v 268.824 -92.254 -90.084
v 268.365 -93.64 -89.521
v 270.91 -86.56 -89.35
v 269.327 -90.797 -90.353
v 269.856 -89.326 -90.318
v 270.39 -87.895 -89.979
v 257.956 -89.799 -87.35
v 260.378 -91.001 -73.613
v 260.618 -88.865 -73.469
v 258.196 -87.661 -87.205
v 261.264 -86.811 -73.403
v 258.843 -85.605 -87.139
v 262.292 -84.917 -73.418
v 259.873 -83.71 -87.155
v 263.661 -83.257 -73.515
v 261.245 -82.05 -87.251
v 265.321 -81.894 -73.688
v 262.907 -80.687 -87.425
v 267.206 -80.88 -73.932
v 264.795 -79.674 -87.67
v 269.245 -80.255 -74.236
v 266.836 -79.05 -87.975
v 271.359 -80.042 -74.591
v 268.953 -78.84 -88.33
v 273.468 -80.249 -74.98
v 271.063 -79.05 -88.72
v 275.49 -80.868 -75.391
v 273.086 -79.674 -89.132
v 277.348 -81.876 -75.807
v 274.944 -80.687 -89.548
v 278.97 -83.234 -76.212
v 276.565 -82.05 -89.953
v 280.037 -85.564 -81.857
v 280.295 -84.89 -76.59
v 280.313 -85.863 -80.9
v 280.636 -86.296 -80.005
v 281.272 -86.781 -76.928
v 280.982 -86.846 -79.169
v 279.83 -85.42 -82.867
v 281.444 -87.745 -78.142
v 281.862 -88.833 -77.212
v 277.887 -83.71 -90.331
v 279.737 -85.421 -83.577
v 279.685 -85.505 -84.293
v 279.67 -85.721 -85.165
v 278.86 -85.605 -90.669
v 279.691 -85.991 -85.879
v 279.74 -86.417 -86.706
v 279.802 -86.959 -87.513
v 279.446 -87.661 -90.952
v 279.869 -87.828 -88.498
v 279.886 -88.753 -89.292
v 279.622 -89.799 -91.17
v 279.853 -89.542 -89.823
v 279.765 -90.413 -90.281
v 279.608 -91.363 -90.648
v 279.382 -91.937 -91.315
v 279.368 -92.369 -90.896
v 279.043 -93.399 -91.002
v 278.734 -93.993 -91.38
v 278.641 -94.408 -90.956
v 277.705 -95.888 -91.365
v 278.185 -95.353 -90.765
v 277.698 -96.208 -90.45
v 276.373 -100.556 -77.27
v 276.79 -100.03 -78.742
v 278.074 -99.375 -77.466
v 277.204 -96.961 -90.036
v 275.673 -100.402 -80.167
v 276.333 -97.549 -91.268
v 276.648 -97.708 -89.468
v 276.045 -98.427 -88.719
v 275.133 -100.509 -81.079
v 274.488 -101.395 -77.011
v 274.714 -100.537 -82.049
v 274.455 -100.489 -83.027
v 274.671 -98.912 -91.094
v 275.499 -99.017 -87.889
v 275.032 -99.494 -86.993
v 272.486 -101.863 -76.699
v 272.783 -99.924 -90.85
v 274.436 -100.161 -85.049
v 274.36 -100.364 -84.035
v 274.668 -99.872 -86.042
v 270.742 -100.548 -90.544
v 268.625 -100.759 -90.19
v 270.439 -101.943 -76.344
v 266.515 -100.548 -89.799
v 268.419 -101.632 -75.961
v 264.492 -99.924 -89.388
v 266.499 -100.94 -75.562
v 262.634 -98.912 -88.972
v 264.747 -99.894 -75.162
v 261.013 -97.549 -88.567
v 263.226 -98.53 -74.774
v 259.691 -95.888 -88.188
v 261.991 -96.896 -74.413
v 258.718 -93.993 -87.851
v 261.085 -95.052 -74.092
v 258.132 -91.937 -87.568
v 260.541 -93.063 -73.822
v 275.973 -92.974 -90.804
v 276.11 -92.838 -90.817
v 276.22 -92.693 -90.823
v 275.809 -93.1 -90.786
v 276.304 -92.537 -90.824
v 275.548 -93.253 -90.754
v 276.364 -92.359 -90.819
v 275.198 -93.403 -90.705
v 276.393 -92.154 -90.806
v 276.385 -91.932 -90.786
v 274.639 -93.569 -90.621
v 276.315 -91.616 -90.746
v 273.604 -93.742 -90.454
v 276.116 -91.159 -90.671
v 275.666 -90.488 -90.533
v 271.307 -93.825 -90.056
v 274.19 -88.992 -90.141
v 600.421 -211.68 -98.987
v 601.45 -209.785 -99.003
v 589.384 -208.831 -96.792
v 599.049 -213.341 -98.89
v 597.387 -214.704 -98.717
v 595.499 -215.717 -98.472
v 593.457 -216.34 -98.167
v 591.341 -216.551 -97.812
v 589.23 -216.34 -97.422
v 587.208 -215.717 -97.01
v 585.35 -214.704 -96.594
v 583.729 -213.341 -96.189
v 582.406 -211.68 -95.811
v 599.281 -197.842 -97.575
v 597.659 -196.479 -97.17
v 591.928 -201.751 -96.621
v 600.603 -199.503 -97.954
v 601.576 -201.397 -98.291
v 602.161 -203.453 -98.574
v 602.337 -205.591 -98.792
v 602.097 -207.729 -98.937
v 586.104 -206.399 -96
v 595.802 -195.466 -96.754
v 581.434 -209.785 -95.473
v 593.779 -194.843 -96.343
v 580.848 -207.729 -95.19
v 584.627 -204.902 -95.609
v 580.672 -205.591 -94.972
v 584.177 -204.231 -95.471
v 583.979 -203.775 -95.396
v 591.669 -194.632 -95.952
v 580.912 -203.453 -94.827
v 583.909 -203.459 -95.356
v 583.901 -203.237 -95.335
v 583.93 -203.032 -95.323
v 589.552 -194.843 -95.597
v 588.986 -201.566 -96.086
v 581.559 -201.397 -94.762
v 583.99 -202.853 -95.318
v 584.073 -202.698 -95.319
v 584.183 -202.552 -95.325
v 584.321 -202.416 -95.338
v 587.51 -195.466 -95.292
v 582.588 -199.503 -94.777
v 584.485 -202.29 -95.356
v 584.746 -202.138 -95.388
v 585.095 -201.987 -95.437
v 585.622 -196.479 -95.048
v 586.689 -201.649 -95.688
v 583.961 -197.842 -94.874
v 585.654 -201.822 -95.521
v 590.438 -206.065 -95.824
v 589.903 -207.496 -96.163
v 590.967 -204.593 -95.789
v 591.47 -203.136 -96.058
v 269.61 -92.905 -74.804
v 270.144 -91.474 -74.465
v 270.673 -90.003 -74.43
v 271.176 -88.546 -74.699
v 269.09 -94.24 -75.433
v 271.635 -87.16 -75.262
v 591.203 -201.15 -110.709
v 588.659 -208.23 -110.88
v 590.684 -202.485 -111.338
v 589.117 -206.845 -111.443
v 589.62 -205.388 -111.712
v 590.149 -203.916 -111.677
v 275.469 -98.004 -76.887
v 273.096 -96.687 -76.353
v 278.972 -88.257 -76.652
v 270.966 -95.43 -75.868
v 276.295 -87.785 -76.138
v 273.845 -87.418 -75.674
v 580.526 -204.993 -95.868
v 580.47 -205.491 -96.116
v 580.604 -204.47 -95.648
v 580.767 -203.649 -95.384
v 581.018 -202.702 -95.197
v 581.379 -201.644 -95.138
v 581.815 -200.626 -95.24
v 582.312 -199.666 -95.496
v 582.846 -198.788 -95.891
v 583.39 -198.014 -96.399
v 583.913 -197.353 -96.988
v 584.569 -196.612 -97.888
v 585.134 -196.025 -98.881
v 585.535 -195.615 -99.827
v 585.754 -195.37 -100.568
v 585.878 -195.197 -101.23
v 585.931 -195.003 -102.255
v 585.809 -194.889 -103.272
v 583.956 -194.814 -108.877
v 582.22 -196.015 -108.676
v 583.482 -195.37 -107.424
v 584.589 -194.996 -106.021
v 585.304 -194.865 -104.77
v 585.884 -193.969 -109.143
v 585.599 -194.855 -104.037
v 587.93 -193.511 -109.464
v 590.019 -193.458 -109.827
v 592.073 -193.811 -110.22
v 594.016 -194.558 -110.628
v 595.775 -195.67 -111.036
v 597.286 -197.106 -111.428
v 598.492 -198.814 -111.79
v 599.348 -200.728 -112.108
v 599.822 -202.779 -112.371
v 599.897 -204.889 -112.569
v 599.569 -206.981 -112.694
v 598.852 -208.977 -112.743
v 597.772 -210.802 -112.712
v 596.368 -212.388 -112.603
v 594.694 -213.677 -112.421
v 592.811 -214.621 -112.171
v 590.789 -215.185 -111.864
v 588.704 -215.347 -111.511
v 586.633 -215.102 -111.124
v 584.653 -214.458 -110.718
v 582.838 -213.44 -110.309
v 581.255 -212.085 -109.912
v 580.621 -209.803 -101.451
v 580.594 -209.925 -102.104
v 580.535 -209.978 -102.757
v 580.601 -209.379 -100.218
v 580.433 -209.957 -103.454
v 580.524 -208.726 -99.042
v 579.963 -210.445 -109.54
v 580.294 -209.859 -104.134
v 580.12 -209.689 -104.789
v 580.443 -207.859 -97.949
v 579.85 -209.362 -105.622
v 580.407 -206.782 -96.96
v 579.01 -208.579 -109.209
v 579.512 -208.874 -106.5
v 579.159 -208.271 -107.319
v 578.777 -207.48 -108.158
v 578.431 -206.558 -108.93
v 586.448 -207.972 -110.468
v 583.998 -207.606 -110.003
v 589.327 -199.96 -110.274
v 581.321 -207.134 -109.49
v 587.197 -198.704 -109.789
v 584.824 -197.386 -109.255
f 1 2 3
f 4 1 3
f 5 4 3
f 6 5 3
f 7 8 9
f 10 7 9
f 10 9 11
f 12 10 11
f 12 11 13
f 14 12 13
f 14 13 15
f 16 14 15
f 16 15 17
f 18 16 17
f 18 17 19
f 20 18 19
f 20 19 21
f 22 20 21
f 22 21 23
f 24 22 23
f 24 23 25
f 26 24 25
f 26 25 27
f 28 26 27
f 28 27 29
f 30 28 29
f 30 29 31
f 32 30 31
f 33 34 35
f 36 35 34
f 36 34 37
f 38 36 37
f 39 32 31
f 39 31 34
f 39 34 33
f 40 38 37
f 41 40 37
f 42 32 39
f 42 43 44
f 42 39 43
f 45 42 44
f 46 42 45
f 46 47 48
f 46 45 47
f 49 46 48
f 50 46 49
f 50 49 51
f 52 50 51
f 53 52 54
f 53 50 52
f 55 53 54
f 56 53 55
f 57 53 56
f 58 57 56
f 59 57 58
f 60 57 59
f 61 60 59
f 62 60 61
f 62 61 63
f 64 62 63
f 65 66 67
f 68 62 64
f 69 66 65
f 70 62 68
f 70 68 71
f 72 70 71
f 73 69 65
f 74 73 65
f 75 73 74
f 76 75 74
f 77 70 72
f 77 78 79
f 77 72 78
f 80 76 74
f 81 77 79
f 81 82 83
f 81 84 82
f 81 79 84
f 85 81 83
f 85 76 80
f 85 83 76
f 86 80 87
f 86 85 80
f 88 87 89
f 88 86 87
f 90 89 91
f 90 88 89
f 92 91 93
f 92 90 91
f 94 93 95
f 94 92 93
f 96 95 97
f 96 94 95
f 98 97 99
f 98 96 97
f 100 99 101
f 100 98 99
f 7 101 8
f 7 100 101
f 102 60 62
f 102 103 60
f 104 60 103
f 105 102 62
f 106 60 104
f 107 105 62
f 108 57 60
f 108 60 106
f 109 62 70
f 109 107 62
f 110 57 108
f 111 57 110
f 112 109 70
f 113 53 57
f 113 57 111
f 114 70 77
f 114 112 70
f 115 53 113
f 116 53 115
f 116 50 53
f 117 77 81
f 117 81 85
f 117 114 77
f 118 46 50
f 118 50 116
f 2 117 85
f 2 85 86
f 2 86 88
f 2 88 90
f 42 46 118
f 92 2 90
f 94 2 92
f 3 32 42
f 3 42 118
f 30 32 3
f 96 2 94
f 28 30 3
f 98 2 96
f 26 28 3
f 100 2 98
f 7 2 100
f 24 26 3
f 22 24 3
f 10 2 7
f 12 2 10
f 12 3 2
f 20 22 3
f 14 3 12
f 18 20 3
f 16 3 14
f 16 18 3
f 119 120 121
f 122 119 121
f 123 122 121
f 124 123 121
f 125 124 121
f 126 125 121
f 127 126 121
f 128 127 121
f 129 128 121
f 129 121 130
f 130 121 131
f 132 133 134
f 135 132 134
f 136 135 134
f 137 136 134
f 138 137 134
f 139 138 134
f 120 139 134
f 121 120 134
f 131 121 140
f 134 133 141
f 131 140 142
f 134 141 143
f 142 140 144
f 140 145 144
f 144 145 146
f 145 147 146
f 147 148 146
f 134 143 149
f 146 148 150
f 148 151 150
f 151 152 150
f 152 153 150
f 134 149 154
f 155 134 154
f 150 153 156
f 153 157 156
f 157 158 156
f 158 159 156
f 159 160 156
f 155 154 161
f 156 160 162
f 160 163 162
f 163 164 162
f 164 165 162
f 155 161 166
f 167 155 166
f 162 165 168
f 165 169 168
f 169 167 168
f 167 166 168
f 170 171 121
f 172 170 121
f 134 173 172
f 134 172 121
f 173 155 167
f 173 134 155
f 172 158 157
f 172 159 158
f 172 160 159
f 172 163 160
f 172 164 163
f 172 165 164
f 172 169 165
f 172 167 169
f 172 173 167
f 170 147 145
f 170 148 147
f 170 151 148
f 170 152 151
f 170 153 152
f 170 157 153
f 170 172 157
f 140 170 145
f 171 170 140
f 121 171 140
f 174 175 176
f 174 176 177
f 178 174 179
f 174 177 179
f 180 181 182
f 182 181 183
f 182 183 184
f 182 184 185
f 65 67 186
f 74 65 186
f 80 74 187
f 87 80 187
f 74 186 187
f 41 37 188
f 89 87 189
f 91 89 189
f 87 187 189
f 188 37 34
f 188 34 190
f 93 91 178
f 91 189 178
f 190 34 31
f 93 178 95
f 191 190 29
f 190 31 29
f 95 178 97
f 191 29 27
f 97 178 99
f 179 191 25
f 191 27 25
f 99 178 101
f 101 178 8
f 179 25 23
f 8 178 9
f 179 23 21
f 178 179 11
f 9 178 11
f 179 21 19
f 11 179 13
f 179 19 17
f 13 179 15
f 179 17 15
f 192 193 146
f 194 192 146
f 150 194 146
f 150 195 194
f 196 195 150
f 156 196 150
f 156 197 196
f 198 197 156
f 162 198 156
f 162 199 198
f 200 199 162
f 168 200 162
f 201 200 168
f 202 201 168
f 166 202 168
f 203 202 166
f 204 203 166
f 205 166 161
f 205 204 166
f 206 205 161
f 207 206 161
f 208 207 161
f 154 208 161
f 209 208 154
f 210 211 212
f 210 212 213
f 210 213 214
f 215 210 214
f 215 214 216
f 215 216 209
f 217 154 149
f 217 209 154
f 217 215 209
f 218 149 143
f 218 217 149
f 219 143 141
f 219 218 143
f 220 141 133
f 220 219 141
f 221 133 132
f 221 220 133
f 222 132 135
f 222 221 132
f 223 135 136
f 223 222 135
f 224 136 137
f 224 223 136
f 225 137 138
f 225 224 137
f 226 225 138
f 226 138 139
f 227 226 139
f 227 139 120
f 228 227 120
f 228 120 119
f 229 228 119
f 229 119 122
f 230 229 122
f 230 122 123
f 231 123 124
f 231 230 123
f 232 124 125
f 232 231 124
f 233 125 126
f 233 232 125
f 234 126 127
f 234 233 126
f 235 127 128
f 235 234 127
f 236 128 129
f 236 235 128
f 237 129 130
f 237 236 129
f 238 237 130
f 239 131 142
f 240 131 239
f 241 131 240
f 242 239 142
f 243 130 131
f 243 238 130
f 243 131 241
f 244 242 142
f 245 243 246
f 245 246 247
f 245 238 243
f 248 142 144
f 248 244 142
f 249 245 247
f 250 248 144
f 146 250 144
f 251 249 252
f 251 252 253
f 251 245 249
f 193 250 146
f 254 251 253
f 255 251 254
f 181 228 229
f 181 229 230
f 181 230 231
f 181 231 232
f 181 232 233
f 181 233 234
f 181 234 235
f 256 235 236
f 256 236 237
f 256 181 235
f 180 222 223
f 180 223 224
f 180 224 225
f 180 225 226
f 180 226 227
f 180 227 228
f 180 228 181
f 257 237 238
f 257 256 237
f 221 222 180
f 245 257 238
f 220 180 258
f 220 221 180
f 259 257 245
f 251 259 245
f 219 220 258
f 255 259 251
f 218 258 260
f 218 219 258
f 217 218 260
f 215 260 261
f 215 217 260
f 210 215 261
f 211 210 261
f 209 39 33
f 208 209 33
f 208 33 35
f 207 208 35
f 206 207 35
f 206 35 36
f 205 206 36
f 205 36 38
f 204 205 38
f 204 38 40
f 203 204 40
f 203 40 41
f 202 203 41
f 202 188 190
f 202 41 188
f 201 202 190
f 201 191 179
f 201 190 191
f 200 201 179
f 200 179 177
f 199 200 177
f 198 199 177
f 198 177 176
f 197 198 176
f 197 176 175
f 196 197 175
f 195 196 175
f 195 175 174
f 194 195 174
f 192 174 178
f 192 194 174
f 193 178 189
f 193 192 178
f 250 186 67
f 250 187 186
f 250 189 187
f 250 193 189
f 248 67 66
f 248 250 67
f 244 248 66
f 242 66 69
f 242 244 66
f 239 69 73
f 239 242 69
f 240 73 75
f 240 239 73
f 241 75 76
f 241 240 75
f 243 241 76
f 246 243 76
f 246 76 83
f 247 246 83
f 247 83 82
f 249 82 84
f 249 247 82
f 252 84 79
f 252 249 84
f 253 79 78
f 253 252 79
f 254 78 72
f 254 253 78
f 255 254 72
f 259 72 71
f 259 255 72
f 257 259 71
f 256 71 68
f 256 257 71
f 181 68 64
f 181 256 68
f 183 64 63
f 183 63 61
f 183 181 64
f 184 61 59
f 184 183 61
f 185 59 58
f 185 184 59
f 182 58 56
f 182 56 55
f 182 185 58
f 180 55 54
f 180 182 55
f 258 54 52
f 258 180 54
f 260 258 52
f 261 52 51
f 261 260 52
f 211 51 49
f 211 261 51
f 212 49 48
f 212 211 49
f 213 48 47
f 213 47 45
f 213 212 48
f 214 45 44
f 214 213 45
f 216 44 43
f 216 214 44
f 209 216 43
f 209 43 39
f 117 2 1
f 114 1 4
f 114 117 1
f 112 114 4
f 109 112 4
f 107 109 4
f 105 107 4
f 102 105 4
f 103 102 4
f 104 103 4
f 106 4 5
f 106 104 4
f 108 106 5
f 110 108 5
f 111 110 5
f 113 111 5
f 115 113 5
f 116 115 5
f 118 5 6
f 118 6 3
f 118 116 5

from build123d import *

# Parameters (mm, degrees)
SUSP_FR_TIE_ROD_PROFILE_R             = 8
SUSP_FR_TIE_ROD_ROD_END_IN_PROFILE_R  = 11
SUSP_FR_TIE_ROD_ROD_END_OUT_PROFILE_R = 11


with BuildPart() as part:
    # SUSP_FR_tie_rod: sweep along a curve in space
    with BuildLine() as susp_fr_tie_rod_path:
        Line((270, -90.4, -82.3915), (590.293517, -204.990503, -103.750386))
    # SUSP_FR_tie_rod profile (on start of the path) → SUSP_FR_tie_rod (sweep)
    with BuildSketch(Plane(origin=(270, -90.4, -82.3915), x_dir=(0.33685766905299525, 0.9415555803032463, 0), z_dir=(0.9397050891891743, -0.3361956240964046, -0.06266456487038859))):
        Circle(SUSP_FR_TIE_ROD_PROFILE_R)
    sweep(path=susp_fr_tie_rod_path.line)

    # SUSP_FR_tie_rod_rod_end_in: sweep along a curve in space
    with BuildLine() as susp_fr_tie_rod_rod_end_in_path:
        Line((271.21105, -91.0008904, -75.5232915), (268.78895, -89.7991096, -89.2597085))
    # SUSP_FR_tie_rod_rod_end_in profile (on start of the path) → SUSP_FR_tie_rod_rod_end_in (sweep)
    with BuildSketch(Plane(origin=(271.21105, -91.0008904, -75.5232915), x_dir=(-0.9848077644799927, 0, 0.17364811262987942), z_dir=(-0.17300714396088532, 0.08584148626193362, -0.9811726491167799))):
        Circle(SUSP_FR_TIE_ROD_ROD_END_IN_PROFILE_R)
    sweep(path=susp_fr_tie_rod_rod_end_in_path.line)

    # SUSP_FR_tie_rod_rod_end_out: sweep along a curve in space
    with BuildLine() as susp_fr_tie_rod_rod_end_out_path:
        Line((591.504567, -205.591393, -96.882177), (589.082466, -204.389612, -110.618594))
    # SUSP_FR_tie_rod_rod_end_out profile (on start of the path) → SUSP_FR_tie_rod_rod_end_out (sweep)
    with BuildSketch(Plane(origin=(591.504567, -205.591393, -96.882177), x_dir=(-0.9848077522197362, 0, 0.17364818216126232), z_dir=(-0.17300721303932562, 0.08584149938158056, -0.9811726357885688))):
        Circle(SUSP_FR_TIE_ROD_ROD_END_OUT_PROFILE_R)
    sweep(path=susp_fr_tie_rod_rod_end_out_path.line)


solid = part.part
